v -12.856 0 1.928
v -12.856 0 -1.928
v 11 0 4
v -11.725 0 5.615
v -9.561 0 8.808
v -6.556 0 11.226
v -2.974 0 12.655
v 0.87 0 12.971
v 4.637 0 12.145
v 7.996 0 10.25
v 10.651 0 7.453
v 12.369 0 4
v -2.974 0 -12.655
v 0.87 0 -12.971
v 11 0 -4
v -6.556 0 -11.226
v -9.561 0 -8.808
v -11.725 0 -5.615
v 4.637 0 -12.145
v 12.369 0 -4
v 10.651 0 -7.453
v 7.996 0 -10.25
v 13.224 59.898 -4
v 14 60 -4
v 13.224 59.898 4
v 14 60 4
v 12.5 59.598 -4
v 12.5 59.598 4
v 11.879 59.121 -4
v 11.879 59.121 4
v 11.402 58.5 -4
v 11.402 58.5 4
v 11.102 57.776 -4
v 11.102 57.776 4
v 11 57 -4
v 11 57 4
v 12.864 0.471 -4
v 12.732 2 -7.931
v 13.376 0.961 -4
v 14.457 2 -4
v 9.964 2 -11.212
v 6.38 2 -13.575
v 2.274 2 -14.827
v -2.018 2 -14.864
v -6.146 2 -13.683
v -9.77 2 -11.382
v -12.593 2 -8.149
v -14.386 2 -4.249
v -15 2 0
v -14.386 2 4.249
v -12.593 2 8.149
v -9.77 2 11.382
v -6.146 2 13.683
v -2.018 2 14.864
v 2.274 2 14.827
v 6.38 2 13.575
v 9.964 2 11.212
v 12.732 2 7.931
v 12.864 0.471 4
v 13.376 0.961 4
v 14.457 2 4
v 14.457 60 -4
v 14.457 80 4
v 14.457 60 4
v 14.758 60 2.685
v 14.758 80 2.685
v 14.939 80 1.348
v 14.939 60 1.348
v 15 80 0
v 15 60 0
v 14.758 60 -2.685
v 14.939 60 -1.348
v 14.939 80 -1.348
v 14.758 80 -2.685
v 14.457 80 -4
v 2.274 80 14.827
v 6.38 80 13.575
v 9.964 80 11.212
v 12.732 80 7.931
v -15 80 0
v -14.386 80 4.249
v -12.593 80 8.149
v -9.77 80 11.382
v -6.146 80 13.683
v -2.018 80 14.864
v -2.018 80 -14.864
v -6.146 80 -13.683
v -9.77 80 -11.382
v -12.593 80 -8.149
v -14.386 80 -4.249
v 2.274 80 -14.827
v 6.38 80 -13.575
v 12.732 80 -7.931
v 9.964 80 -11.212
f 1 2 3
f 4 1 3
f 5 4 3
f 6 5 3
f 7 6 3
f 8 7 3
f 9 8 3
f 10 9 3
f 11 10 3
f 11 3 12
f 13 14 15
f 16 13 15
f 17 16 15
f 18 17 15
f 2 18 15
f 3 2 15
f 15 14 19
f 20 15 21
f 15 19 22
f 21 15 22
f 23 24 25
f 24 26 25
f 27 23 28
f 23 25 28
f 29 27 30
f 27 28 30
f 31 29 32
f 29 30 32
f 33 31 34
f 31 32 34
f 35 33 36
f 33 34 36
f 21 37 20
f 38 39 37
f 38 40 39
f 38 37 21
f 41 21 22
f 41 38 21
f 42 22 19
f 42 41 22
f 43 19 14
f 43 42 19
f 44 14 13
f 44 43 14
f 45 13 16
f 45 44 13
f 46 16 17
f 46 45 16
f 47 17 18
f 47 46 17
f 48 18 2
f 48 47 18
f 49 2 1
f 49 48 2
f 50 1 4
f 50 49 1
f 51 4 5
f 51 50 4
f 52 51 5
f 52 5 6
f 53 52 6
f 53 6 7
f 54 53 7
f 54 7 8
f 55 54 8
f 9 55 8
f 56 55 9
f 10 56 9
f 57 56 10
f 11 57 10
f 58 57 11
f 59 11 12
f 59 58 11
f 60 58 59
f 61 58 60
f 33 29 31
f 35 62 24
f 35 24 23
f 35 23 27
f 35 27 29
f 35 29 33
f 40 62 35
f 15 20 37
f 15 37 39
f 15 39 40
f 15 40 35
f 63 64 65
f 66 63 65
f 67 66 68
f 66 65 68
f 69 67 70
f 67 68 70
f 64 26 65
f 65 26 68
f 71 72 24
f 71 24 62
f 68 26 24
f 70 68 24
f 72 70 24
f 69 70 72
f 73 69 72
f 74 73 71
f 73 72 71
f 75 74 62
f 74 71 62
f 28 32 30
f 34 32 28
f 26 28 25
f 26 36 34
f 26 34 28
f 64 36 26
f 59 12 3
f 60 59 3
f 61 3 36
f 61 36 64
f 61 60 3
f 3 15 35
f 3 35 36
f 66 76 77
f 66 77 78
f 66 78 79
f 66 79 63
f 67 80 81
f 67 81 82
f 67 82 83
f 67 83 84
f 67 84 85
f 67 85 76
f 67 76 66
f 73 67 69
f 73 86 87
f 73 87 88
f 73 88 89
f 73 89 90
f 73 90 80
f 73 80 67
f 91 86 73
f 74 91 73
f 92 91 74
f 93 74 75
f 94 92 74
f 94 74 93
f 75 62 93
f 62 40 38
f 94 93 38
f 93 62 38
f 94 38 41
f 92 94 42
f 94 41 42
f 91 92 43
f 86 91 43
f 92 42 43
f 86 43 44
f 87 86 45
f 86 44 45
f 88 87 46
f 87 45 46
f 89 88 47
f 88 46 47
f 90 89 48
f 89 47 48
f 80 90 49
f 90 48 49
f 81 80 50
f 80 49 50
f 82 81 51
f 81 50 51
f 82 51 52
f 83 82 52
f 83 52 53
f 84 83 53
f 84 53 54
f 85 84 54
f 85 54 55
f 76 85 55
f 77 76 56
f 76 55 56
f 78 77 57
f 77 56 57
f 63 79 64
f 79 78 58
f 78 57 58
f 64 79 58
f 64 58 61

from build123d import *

# Parameters (mm, degrees)
SKETCH1_R           = 15
BOSS_EXTRUDE1_DEPTH = 80
CUT_EXTRUDE1_DEPTH  = 60
FILLET1_R           = 3
CHAMFER1_SIZE       = 2


with BuildPart() as part:
    # Sketch1 → Boss-Extrude1 (new body)
    with BuildSketch(Plane(origin=(0, 0, 0), x_dir=(1, 0, 0), z_dir=(0, 1, 0))):
        Circle(SKETCH1_R)
    extrude(amount=BOSS_EXTRUDE1_DEPTH)

    # Sketch1<3> → Cut-Extrude1 (cut)
    with BuildSketch(Plane(origin=(0, 0, 0), x_dir=(1, 0, 0), z_dir=(0, 1, 0))):
        with BuildLine():
            Line((14.456832295, 4), (11, 4))
            Line((11, 4), (11, -4))
            Line((11, -4), (14.456832295, -4))
            ThreePointArc((14.456832295, -4), (14.863587797, -2.018355219), (15, 0))
            ThreePointArc((15, 0), (14.863587797, 2.018355219), (14.456832295, 4))
        make_face()
    extrude(amount=CUT_EXTRUDE1_DEPTH, mode=Mode.SUBTRACT)

    # Fillet1
    fillet1_edges = [part.edges().sort_by_distance(p)[0] for p in [
        (11, 60, 0),
    ]]
    fillet(fillet1_edges, radius=FILLET1_R)

    # Chamfer1
    chamfer1_edges = [part.edges().sort_by_distance(p)[0] for p in [
        (-15, 0, 0),
    ]]
    chamfer(chamfer1_edges, length=CHAMFER1_SIZE)


solid = part.part
